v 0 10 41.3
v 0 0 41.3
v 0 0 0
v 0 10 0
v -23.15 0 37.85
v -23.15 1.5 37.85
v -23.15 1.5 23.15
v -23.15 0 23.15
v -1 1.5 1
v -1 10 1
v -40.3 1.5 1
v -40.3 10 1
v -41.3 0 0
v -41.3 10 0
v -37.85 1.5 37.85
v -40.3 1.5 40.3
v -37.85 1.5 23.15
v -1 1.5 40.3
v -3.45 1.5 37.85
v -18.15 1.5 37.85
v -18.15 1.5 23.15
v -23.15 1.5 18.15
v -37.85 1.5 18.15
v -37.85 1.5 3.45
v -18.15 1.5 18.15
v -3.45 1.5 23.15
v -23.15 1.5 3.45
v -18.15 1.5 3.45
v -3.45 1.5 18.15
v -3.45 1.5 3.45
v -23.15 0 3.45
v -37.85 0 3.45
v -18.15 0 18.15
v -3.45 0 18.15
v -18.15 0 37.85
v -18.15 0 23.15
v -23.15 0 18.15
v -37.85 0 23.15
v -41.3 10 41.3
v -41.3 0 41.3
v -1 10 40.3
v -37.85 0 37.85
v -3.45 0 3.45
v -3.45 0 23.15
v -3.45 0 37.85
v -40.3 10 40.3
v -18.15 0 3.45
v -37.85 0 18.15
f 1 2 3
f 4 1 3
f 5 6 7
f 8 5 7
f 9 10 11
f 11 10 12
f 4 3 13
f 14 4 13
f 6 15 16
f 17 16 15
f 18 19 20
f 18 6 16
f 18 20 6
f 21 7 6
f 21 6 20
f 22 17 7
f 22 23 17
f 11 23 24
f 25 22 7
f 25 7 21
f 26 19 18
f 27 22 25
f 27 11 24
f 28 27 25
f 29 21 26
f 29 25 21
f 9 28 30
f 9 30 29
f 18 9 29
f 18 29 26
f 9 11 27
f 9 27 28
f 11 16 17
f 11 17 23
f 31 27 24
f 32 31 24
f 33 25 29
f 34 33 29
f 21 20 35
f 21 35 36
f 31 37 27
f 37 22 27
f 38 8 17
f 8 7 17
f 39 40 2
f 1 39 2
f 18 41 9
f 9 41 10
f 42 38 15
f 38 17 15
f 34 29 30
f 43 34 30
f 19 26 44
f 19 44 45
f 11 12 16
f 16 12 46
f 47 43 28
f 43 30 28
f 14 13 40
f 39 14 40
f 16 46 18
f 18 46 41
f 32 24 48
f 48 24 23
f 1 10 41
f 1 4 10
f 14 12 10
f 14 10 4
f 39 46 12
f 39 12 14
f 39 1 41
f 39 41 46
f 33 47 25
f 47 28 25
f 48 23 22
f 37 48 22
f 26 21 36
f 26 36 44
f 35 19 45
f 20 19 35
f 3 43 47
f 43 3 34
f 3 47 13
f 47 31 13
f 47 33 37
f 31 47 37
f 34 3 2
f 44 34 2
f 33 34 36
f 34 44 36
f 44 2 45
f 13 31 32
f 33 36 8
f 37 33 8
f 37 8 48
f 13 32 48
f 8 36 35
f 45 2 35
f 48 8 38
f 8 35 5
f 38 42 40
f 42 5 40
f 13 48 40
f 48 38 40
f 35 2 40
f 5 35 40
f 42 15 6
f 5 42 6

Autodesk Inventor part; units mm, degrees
ref_plane "YZ Plane" through (0, 0, 0) normal (1, 0, 0) x (0, 1, 0)
ref_plane "XZ Plane" through (0, 0, 0) normal (0, 1, 0) x (-1, 0, 0)
ref_plane "XY Plane" through (0, 0, 0) normal (0, 0, 1) x (1, 0, 0)
sketch "Sketch1" plane through (0, 0, 0) normal (0, 1, 0) x (-1, 0, 0)
  line L0 (0, 0) -> (41.3, 0)
  line L1 (41.3, 0) -> (41.3, 41.3)
  line L2 (41.3, 41.3) -> (0, 41.3)
  line L3 (0, 41.3) -> (0, 0)
  dimension "d0" = 41.3
  dimension "d1" = 41.3
extrude "Extrusion1" add sketch "Sketch1" along normal blind 10
sketch "Sketch8" plane through (0, 10, 0) normal (0, 1, 0) x (1, 0, 0)
  line L0 (-1, -1) -> (-40.3, -1)
  line L1 (-40.3, -1) -> (-40.3, -40.3)
  line L2 (-40.3, -40.3) -> (-1, -40.3)
  line L3 (-1, -40.3) -> (-1, -1)
  line L4 (0, 0) -> (-41.3, 0) projected
  line L5 (0, -41.3) -> (0, 0) projected
  dimension "d61" = 39.3
  dimension "d62" = 39.3
  dimension "d63" = 1
  dimension "d64" = 1
extrude "Extrusion7" cut sketch "Sketch8" against normal blind 8.5
sketch "Sketch9" plane through (0, 1.5, 0) normal (0, 1, 0) x (1, 0, 0)
  line L0 (-3.45, -3.45) -> (-18.15, -3.45)
  line L1 (-18.15, -3.45) -> (-18.15, -18.15)
  line L2 (-18.15, -18.15) -> (-3.45, -18.15)
  line L3 (-3.45, -18.15) -> (-3.45, -3.45)
  line L4 (-1, -1) -> (-1, -40.3) projected
  line L5 (-40.3, -1) -> (-1, -1) projected
  line L6 (-23.15, -3.45) -> (-37.85, -3.45)
  line L7 (-37.85, -3.45) -> (-37.85, -18.15)
  line L8 (-37.85, -18.15) -> (-23.15, -18.15)
  line L9 (-23.15, -18.15) -> (-23.15, -3.45)
  line L10 (-23.15, -23.15) -> (-37.85, -23.15)
  line L11 (-37.85, -23.15) -> (-37.85, -37.85)
  line L12 (-37.85, -37.85) -> (-23.15, -37.85)
  line L13 (-23.15, -37.85) -> (-23.15, -23.15)
  line L14 (-40.3, -40.3) -> (-40.3, -1) projected
  line L15 (-18.15, -23.15) -> (-3.45, -23.15)
  line L16 (-3.45, -23.15) -> (-3.45, -37.85)
  line L17 (-3.45, -37.85) -> (-18.15, -37.85)
  line L18 (-18.15, -37.85) -> (-18.15, -23.15)
  point P0 (0, 0)
  dimension "d67" = 14.7
  dimension "d68" = 14.7
  dimension "d69" = 2.45
  dimension "d70" = 2.45
  dimension "d71" = 14.7
  dimension "d72" = 14.7
  dimension "d73" = 5
  dimension "d74" = 14.7
  dimension "d75" = 14.7
  dimension "d76" = 5
  dimension "d77" = 2.45
  dimension "d78" = 14.7
  dimension "d79" = 14.7
  dimension "d80" = 5
  dimension "d81" = 5
extrude "Extrusion8" cut sketch "Sketch9" against normal blind 8.5
properties part number "test plate"
